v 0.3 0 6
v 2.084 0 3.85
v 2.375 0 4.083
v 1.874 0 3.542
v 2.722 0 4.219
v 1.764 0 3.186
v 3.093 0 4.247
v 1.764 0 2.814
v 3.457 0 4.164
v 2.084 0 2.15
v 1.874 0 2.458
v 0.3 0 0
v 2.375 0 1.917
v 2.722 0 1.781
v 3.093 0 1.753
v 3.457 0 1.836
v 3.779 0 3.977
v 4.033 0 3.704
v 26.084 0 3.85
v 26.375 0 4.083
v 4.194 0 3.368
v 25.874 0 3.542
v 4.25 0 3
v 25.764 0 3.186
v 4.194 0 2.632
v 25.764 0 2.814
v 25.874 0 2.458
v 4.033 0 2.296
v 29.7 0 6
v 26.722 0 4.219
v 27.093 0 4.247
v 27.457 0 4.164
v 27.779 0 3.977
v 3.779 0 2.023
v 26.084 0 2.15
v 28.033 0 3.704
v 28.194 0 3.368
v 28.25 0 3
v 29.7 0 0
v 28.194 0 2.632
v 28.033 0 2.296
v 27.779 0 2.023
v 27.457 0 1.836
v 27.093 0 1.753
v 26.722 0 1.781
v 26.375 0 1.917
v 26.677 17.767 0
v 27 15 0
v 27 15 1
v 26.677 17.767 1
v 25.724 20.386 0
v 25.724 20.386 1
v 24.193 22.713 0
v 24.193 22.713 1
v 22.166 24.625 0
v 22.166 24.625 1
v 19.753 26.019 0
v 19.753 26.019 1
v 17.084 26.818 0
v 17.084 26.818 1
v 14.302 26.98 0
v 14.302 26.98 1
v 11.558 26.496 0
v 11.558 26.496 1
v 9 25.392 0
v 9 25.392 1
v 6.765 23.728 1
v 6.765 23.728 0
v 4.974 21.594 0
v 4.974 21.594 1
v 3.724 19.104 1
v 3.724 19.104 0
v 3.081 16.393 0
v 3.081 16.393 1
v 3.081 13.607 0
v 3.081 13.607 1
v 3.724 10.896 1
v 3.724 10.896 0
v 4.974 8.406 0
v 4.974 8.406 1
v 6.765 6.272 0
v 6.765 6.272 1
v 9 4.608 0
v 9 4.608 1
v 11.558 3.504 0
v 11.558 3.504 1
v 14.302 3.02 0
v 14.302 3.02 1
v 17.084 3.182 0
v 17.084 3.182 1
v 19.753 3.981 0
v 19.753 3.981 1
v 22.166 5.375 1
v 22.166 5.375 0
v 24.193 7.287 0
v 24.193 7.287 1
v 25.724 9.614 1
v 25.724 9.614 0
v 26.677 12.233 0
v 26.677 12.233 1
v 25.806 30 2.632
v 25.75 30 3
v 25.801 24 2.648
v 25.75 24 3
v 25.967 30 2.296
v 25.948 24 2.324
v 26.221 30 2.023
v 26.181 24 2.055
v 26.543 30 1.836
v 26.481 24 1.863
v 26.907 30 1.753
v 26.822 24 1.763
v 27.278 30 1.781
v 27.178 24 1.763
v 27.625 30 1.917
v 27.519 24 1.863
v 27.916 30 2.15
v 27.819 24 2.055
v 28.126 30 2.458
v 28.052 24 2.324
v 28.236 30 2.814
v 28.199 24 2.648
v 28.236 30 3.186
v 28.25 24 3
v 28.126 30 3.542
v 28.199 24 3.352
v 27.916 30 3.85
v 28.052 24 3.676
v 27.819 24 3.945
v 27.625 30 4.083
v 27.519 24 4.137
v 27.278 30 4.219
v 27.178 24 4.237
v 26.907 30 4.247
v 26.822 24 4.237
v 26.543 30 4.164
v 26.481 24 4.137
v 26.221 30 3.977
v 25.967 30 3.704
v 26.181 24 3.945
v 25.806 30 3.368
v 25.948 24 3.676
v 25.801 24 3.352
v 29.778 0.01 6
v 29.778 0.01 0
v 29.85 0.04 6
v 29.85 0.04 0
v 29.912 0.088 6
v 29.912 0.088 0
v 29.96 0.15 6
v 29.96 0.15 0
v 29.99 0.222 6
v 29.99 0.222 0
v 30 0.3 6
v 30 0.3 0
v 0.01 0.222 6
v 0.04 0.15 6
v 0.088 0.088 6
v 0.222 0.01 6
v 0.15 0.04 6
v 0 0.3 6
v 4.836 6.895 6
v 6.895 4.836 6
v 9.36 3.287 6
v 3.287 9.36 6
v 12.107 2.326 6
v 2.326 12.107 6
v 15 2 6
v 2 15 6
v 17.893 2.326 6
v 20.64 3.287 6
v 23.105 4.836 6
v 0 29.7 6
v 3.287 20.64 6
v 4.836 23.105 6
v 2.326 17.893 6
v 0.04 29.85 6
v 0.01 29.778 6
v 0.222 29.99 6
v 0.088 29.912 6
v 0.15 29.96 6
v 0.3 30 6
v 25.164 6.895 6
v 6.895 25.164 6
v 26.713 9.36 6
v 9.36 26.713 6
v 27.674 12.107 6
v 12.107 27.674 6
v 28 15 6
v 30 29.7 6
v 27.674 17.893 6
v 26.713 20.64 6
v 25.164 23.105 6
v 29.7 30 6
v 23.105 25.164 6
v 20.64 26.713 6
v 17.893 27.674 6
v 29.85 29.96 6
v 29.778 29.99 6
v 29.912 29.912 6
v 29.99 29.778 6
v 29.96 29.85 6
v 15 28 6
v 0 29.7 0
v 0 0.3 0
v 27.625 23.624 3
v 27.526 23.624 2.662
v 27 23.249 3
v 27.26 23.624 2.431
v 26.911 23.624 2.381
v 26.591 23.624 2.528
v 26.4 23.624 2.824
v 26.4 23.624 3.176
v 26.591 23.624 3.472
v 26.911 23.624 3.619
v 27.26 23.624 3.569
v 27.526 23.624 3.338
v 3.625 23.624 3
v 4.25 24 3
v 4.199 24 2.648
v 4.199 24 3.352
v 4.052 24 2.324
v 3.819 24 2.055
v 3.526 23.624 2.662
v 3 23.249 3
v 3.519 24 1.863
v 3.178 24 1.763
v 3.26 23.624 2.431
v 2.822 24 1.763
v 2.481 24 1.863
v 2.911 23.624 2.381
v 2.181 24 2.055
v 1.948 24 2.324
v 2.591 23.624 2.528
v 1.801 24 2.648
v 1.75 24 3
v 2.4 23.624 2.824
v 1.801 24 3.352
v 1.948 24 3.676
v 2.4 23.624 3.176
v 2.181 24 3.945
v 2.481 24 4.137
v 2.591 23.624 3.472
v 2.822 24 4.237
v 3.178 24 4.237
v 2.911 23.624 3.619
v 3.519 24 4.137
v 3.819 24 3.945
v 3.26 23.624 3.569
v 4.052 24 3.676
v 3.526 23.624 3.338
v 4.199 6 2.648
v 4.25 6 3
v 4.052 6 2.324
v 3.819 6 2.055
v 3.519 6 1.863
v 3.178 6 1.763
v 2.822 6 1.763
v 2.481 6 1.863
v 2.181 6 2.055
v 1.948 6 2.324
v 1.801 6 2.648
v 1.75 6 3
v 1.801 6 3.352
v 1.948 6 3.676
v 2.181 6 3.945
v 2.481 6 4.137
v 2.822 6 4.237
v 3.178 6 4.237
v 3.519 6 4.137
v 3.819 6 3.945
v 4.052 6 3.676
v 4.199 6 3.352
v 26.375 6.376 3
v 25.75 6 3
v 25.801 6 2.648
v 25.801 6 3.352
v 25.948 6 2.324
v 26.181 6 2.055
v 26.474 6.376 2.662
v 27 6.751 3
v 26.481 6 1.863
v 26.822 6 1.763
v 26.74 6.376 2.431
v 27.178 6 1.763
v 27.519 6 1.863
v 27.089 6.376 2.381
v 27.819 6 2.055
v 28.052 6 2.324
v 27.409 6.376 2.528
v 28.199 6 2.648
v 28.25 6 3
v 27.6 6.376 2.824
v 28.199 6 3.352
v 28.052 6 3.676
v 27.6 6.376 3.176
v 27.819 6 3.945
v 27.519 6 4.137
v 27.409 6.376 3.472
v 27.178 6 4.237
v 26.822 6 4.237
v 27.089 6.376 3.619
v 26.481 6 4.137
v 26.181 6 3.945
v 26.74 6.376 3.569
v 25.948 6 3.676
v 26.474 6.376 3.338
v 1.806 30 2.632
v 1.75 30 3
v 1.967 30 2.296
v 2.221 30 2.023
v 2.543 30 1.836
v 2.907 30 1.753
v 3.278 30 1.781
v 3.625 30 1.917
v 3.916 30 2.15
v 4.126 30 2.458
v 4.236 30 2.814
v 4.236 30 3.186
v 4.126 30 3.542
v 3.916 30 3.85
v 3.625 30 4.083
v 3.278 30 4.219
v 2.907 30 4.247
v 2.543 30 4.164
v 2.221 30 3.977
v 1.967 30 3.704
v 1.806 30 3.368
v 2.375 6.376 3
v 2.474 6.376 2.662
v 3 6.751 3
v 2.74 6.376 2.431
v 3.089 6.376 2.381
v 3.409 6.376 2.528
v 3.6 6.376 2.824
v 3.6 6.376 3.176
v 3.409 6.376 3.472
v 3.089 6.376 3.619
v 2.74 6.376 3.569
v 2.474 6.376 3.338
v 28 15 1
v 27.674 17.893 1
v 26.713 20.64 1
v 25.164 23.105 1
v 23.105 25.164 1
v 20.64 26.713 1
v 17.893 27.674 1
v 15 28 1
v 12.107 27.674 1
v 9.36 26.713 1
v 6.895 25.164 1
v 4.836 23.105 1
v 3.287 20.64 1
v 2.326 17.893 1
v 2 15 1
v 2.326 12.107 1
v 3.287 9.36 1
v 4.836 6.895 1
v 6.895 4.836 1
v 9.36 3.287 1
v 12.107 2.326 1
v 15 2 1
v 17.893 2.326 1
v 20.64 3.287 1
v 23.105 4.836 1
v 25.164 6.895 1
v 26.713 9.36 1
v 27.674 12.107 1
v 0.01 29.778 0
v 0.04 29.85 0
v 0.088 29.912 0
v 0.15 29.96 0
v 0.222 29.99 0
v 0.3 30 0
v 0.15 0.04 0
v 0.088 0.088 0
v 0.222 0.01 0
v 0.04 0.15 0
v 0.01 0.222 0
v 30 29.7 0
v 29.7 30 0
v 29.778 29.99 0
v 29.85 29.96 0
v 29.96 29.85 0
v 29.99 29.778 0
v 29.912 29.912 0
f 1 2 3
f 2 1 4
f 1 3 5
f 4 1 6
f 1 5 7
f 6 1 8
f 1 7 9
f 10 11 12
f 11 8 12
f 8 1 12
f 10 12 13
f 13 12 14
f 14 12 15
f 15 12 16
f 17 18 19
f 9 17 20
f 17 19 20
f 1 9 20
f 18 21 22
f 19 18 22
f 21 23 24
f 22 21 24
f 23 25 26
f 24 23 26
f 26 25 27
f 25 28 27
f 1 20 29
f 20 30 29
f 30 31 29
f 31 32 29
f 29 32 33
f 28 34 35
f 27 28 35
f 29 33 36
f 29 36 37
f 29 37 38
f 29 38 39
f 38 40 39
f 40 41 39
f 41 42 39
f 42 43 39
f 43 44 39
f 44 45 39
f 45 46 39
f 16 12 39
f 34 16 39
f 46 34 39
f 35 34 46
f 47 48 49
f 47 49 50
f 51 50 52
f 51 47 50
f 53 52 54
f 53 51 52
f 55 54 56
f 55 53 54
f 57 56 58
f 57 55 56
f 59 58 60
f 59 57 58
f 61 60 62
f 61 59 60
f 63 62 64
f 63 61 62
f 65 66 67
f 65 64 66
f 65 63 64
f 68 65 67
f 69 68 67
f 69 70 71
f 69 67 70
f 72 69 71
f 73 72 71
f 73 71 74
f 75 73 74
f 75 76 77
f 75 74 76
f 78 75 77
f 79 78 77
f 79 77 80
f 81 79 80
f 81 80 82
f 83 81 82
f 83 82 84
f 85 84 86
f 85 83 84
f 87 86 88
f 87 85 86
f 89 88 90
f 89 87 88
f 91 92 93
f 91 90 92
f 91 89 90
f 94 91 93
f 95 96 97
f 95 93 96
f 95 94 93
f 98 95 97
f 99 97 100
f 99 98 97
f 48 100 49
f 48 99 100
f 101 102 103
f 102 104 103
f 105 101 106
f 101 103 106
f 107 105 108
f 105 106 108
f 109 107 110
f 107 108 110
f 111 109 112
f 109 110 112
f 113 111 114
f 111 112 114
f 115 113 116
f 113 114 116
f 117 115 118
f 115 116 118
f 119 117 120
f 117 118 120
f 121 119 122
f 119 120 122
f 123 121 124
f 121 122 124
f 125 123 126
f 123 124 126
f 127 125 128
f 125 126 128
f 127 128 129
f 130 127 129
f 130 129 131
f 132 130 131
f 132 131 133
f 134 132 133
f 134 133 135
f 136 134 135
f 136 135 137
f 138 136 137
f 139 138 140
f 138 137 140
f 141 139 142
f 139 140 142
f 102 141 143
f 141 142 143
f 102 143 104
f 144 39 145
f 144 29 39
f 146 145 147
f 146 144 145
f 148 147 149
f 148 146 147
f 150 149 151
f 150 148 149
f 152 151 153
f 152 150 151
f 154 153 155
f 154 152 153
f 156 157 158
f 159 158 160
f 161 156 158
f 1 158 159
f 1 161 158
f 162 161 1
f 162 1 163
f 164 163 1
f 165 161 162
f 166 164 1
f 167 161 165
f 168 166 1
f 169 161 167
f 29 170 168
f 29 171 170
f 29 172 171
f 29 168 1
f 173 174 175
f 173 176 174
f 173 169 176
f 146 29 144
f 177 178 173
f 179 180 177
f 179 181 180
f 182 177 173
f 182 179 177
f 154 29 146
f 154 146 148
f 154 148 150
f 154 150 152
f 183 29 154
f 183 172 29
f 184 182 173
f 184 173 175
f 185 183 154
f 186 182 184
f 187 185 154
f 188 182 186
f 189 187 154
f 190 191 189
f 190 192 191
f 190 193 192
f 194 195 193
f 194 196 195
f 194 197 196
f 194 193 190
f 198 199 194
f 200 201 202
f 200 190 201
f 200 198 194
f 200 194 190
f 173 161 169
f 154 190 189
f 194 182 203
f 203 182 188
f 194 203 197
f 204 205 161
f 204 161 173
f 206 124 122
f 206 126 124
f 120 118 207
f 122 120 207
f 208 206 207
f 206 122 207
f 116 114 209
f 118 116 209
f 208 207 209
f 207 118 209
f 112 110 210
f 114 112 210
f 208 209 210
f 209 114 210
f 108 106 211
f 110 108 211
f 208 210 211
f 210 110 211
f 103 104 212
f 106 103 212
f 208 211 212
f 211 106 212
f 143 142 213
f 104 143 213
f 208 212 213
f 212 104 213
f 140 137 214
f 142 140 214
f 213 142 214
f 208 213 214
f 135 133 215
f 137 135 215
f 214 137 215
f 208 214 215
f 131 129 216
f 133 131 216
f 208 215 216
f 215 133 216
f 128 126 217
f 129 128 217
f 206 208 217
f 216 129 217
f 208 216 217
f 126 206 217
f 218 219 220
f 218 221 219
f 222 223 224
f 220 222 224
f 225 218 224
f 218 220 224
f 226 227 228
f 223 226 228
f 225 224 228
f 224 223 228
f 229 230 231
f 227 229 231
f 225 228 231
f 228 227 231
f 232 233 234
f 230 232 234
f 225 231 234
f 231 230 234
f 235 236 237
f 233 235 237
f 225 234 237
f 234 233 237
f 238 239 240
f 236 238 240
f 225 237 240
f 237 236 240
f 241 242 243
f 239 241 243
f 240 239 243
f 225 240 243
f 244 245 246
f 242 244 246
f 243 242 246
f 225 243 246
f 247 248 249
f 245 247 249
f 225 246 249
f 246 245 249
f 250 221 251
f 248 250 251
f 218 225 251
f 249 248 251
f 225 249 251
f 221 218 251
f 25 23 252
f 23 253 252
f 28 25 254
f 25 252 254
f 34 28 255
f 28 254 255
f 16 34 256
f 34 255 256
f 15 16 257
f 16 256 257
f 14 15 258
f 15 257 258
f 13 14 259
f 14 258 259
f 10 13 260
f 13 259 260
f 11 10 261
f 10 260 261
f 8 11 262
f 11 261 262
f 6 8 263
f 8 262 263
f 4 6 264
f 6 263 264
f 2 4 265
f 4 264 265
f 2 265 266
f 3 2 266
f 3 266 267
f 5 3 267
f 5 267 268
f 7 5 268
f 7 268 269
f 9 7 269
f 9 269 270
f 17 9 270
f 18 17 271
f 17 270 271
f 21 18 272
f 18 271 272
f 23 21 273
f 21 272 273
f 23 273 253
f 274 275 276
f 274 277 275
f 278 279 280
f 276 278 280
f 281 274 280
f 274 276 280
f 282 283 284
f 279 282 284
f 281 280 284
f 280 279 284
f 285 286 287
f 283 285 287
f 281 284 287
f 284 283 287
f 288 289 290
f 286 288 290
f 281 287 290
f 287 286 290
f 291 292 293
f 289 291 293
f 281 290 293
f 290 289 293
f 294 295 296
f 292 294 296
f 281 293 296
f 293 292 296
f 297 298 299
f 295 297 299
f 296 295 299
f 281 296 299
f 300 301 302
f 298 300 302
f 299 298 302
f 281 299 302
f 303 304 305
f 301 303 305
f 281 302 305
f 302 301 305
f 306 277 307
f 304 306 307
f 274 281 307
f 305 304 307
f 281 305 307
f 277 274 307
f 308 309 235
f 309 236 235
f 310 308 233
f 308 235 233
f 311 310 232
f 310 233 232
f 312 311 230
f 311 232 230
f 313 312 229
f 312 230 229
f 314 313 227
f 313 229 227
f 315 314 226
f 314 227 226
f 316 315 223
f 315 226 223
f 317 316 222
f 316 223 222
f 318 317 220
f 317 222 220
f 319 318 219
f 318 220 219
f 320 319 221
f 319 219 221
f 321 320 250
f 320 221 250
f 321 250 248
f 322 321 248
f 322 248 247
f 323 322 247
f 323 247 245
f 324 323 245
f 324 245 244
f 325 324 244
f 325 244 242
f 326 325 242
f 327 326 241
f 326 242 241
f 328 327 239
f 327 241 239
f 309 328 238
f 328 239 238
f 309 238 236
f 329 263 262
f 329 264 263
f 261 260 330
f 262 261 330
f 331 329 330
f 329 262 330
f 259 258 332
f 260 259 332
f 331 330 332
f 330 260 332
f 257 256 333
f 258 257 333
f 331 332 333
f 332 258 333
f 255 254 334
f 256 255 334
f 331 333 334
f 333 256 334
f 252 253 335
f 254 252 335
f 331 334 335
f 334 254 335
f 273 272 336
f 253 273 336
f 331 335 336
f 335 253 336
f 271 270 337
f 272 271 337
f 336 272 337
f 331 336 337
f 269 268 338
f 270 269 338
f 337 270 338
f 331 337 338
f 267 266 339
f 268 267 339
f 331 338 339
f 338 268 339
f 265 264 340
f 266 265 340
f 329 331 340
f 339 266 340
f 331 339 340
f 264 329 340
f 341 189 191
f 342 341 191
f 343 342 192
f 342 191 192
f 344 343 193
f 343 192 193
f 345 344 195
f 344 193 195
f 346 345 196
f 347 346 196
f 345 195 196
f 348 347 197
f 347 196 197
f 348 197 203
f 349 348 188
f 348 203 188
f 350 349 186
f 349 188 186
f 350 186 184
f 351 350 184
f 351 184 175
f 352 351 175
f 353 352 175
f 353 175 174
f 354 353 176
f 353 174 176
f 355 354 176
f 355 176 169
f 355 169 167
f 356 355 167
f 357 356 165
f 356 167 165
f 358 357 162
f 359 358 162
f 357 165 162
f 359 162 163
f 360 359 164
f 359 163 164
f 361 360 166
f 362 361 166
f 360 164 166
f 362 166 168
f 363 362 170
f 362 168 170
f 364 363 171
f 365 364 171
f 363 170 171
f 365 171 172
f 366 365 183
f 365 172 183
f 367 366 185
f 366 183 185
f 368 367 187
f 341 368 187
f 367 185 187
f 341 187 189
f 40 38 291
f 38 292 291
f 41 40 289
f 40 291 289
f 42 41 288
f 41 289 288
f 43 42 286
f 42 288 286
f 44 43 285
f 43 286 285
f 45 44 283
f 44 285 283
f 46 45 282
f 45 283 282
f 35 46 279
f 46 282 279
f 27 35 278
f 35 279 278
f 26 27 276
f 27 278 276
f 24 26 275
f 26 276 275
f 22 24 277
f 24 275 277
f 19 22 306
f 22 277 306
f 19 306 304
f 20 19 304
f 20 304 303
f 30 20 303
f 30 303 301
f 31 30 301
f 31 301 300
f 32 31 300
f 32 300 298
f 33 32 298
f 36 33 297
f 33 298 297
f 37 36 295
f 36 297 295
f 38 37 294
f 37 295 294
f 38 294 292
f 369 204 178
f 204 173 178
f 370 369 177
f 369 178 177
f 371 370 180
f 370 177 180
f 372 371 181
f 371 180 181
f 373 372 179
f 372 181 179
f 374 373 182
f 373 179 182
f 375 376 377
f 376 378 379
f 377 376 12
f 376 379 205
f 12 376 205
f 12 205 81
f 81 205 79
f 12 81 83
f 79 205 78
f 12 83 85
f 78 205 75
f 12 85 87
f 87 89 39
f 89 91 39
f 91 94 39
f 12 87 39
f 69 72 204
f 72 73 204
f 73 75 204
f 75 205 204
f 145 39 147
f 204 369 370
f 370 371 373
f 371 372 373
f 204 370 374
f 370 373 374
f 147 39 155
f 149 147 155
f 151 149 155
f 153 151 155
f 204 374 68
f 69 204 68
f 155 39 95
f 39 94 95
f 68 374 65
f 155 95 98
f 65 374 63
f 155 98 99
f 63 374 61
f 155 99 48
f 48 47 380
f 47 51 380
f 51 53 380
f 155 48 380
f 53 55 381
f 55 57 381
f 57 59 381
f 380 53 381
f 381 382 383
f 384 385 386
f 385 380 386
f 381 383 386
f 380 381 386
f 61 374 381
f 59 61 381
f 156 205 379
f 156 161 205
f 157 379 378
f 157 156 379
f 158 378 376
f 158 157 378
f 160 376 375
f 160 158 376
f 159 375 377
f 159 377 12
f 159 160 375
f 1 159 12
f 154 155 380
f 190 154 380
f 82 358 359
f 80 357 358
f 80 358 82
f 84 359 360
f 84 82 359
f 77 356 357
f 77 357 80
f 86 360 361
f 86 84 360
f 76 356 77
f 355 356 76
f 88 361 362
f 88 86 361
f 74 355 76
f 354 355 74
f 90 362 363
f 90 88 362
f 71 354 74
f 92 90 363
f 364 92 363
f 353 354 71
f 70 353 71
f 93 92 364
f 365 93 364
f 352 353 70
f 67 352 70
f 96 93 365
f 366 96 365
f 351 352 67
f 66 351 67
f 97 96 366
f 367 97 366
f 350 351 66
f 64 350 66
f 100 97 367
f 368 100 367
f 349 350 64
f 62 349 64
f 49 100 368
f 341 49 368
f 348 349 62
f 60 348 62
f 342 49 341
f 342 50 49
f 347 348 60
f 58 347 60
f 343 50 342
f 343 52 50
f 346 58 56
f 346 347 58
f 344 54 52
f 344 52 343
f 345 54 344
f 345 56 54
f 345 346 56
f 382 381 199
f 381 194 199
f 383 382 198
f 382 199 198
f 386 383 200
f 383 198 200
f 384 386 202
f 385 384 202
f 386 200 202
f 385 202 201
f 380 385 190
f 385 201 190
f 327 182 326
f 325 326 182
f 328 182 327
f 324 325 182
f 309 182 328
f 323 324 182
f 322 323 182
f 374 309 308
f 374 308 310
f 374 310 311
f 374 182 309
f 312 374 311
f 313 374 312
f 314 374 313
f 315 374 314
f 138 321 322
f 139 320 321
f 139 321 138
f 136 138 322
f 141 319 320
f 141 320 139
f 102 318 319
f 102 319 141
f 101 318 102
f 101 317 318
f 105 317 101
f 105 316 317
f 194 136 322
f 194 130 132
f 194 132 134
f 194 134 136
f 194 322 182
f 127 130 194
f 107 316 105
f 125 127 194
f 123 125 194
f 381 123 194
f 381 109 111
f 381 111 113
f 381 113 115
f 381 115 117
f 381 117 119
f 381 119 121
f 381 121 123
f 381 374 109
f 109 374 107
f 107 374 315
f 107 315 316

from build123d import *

# Parameters (mm, degrees)
ESQUISSE1_W                                   = 30
ESQUISSE1_H                                   = 30
ESQUISSE1_R                                   = 12
BOSS_EXTRU_1_DEPTH                            = 6
ESQUISSE2_R                                   = 13
ENL_V_MAT_EXTRU_1_DEPTH                       = 5
TROU_POUR_TARAUDAGE_POUR_TROU_TARAUD_M3_D     = 2.5
TROU_POUR_TARAUDAGE_POUR_TROU_TARAUD_M3_DEPTH = 6
TROU_POUR_TARAUDAGE_POUR_TROU_TARAUD_M3_TIP   = 0.751075774
TROU_POUR_TARAUDAGE_POUR_TROU_TARAUD_2_D      = 2.5
TROU_POUR_TARAUDAGE_POUR_TROU_TARAUD_2_DEPTH  = 6
TROU_POUR_TARAUDAGE_POUR_TROU_TARAUD_2_TIP    = 0.751075774
CONG_1_R                                      = 0.3


with BuildPart() as part:
    # Esquisse1 → Boss.-Extru.1 (new body)
    with BuildSketch(Plane.XY):
        with Locations((15, 15)):
            Rectangle(ESQUISSE1_W, ESQUISSE1_H)
        with Locations((15, 15)):
            Circle(ESQUISSE1_R, mode=Mode.SUBTRACT)
    extrude(amount=BOSS_EXTRU_1_DEPTH)

    # Esquisse2 → Enlèv. mat.-Extru.1 (cut)
    with BuildSketch(Plane.XY.offset(6)):
        with Locations((15, 15)):
            Circle(ESQUISSE2_R)
    extrude(amount=-ENL_V_MAT_EXTRU_1_DEPTH, mode=Mode.SUBTRACT)

    # Trou pour taraudage pour trou taraud_ M3
    with Locations(Plane(origin=(0, 30, 0), x_dir=(1, 0, 0), z_dir=(0, 1, 0))):
        with Locations((3, -3), (27, -3)):
            Hole(TROU_POUR_TARAUDAGE_POUR_TROU_TARAUD_M3_D / 2, depth=TROU_POUR_TARAUDAGE_POUR_TROU_TARAUD_M3_DEPTH)
            with Locations((0, 0, -(TROU_POUR_TARAUDAGE_POUR_TROU_TARAUD_M3_DEPTH + TROU_POUR_TARAUDAGE_POUR_TROU_TARAUD_M3_TIP / 2))):  # 118° drill point
                Cone(0, TROU_POUR_TARAUDAGE_POUR_TROU_TARAUD_M3_D / 2, TROU_POUR_TARAUDAGE_POUR_TROU_TARAUD_M3_TIP, mode=Mode.SUBTRACT)

    # Trou pour taraudage pour trou taraud 2
    with Locations(Plane(origin=(0, 0, 0), x_dir=(-1, 0, 0), z_dir=(0, -1, 0))):
        with Locations((-3, -3), (-27, -3)):
            Hole(TROU_POUR_TARAUDAGE_POUR_TROU_TARAUD_2_D / 2, depth=TROU_POUR_TARAUDAGE_POUR_TROU_TARAUD_2_DEPTH)
            with Locations((0, 0, -(TROU_POUR_TARAUDAGE_POUR_TROU_TARAUD_2_DEPTH + TROU_POUR_TARAUDAGE_POUR_TROU_TARAUD_2_TIP / 2))):  # 118° drill point
                Cone(0, TROU_POUR_TARAUDAGE_POUR_TROU_TARAUD_2_D / 2, TROU_POUR_TARAUDAGE_POUR_TROU_TARAUD_2_TIP, mode=Mode.SUBTRACT)

    # Congé1
    cong_1_edges = [part.edges().sort_by_distance(p)[0] for p in [
        (0, 30, 3),
        (30, 30, 3),
        (30, 0, 3),
        (0, 0, 3),
    ]]
    fillet(cong_1_edges, radius=CONG_1_R)


solid = part.part
